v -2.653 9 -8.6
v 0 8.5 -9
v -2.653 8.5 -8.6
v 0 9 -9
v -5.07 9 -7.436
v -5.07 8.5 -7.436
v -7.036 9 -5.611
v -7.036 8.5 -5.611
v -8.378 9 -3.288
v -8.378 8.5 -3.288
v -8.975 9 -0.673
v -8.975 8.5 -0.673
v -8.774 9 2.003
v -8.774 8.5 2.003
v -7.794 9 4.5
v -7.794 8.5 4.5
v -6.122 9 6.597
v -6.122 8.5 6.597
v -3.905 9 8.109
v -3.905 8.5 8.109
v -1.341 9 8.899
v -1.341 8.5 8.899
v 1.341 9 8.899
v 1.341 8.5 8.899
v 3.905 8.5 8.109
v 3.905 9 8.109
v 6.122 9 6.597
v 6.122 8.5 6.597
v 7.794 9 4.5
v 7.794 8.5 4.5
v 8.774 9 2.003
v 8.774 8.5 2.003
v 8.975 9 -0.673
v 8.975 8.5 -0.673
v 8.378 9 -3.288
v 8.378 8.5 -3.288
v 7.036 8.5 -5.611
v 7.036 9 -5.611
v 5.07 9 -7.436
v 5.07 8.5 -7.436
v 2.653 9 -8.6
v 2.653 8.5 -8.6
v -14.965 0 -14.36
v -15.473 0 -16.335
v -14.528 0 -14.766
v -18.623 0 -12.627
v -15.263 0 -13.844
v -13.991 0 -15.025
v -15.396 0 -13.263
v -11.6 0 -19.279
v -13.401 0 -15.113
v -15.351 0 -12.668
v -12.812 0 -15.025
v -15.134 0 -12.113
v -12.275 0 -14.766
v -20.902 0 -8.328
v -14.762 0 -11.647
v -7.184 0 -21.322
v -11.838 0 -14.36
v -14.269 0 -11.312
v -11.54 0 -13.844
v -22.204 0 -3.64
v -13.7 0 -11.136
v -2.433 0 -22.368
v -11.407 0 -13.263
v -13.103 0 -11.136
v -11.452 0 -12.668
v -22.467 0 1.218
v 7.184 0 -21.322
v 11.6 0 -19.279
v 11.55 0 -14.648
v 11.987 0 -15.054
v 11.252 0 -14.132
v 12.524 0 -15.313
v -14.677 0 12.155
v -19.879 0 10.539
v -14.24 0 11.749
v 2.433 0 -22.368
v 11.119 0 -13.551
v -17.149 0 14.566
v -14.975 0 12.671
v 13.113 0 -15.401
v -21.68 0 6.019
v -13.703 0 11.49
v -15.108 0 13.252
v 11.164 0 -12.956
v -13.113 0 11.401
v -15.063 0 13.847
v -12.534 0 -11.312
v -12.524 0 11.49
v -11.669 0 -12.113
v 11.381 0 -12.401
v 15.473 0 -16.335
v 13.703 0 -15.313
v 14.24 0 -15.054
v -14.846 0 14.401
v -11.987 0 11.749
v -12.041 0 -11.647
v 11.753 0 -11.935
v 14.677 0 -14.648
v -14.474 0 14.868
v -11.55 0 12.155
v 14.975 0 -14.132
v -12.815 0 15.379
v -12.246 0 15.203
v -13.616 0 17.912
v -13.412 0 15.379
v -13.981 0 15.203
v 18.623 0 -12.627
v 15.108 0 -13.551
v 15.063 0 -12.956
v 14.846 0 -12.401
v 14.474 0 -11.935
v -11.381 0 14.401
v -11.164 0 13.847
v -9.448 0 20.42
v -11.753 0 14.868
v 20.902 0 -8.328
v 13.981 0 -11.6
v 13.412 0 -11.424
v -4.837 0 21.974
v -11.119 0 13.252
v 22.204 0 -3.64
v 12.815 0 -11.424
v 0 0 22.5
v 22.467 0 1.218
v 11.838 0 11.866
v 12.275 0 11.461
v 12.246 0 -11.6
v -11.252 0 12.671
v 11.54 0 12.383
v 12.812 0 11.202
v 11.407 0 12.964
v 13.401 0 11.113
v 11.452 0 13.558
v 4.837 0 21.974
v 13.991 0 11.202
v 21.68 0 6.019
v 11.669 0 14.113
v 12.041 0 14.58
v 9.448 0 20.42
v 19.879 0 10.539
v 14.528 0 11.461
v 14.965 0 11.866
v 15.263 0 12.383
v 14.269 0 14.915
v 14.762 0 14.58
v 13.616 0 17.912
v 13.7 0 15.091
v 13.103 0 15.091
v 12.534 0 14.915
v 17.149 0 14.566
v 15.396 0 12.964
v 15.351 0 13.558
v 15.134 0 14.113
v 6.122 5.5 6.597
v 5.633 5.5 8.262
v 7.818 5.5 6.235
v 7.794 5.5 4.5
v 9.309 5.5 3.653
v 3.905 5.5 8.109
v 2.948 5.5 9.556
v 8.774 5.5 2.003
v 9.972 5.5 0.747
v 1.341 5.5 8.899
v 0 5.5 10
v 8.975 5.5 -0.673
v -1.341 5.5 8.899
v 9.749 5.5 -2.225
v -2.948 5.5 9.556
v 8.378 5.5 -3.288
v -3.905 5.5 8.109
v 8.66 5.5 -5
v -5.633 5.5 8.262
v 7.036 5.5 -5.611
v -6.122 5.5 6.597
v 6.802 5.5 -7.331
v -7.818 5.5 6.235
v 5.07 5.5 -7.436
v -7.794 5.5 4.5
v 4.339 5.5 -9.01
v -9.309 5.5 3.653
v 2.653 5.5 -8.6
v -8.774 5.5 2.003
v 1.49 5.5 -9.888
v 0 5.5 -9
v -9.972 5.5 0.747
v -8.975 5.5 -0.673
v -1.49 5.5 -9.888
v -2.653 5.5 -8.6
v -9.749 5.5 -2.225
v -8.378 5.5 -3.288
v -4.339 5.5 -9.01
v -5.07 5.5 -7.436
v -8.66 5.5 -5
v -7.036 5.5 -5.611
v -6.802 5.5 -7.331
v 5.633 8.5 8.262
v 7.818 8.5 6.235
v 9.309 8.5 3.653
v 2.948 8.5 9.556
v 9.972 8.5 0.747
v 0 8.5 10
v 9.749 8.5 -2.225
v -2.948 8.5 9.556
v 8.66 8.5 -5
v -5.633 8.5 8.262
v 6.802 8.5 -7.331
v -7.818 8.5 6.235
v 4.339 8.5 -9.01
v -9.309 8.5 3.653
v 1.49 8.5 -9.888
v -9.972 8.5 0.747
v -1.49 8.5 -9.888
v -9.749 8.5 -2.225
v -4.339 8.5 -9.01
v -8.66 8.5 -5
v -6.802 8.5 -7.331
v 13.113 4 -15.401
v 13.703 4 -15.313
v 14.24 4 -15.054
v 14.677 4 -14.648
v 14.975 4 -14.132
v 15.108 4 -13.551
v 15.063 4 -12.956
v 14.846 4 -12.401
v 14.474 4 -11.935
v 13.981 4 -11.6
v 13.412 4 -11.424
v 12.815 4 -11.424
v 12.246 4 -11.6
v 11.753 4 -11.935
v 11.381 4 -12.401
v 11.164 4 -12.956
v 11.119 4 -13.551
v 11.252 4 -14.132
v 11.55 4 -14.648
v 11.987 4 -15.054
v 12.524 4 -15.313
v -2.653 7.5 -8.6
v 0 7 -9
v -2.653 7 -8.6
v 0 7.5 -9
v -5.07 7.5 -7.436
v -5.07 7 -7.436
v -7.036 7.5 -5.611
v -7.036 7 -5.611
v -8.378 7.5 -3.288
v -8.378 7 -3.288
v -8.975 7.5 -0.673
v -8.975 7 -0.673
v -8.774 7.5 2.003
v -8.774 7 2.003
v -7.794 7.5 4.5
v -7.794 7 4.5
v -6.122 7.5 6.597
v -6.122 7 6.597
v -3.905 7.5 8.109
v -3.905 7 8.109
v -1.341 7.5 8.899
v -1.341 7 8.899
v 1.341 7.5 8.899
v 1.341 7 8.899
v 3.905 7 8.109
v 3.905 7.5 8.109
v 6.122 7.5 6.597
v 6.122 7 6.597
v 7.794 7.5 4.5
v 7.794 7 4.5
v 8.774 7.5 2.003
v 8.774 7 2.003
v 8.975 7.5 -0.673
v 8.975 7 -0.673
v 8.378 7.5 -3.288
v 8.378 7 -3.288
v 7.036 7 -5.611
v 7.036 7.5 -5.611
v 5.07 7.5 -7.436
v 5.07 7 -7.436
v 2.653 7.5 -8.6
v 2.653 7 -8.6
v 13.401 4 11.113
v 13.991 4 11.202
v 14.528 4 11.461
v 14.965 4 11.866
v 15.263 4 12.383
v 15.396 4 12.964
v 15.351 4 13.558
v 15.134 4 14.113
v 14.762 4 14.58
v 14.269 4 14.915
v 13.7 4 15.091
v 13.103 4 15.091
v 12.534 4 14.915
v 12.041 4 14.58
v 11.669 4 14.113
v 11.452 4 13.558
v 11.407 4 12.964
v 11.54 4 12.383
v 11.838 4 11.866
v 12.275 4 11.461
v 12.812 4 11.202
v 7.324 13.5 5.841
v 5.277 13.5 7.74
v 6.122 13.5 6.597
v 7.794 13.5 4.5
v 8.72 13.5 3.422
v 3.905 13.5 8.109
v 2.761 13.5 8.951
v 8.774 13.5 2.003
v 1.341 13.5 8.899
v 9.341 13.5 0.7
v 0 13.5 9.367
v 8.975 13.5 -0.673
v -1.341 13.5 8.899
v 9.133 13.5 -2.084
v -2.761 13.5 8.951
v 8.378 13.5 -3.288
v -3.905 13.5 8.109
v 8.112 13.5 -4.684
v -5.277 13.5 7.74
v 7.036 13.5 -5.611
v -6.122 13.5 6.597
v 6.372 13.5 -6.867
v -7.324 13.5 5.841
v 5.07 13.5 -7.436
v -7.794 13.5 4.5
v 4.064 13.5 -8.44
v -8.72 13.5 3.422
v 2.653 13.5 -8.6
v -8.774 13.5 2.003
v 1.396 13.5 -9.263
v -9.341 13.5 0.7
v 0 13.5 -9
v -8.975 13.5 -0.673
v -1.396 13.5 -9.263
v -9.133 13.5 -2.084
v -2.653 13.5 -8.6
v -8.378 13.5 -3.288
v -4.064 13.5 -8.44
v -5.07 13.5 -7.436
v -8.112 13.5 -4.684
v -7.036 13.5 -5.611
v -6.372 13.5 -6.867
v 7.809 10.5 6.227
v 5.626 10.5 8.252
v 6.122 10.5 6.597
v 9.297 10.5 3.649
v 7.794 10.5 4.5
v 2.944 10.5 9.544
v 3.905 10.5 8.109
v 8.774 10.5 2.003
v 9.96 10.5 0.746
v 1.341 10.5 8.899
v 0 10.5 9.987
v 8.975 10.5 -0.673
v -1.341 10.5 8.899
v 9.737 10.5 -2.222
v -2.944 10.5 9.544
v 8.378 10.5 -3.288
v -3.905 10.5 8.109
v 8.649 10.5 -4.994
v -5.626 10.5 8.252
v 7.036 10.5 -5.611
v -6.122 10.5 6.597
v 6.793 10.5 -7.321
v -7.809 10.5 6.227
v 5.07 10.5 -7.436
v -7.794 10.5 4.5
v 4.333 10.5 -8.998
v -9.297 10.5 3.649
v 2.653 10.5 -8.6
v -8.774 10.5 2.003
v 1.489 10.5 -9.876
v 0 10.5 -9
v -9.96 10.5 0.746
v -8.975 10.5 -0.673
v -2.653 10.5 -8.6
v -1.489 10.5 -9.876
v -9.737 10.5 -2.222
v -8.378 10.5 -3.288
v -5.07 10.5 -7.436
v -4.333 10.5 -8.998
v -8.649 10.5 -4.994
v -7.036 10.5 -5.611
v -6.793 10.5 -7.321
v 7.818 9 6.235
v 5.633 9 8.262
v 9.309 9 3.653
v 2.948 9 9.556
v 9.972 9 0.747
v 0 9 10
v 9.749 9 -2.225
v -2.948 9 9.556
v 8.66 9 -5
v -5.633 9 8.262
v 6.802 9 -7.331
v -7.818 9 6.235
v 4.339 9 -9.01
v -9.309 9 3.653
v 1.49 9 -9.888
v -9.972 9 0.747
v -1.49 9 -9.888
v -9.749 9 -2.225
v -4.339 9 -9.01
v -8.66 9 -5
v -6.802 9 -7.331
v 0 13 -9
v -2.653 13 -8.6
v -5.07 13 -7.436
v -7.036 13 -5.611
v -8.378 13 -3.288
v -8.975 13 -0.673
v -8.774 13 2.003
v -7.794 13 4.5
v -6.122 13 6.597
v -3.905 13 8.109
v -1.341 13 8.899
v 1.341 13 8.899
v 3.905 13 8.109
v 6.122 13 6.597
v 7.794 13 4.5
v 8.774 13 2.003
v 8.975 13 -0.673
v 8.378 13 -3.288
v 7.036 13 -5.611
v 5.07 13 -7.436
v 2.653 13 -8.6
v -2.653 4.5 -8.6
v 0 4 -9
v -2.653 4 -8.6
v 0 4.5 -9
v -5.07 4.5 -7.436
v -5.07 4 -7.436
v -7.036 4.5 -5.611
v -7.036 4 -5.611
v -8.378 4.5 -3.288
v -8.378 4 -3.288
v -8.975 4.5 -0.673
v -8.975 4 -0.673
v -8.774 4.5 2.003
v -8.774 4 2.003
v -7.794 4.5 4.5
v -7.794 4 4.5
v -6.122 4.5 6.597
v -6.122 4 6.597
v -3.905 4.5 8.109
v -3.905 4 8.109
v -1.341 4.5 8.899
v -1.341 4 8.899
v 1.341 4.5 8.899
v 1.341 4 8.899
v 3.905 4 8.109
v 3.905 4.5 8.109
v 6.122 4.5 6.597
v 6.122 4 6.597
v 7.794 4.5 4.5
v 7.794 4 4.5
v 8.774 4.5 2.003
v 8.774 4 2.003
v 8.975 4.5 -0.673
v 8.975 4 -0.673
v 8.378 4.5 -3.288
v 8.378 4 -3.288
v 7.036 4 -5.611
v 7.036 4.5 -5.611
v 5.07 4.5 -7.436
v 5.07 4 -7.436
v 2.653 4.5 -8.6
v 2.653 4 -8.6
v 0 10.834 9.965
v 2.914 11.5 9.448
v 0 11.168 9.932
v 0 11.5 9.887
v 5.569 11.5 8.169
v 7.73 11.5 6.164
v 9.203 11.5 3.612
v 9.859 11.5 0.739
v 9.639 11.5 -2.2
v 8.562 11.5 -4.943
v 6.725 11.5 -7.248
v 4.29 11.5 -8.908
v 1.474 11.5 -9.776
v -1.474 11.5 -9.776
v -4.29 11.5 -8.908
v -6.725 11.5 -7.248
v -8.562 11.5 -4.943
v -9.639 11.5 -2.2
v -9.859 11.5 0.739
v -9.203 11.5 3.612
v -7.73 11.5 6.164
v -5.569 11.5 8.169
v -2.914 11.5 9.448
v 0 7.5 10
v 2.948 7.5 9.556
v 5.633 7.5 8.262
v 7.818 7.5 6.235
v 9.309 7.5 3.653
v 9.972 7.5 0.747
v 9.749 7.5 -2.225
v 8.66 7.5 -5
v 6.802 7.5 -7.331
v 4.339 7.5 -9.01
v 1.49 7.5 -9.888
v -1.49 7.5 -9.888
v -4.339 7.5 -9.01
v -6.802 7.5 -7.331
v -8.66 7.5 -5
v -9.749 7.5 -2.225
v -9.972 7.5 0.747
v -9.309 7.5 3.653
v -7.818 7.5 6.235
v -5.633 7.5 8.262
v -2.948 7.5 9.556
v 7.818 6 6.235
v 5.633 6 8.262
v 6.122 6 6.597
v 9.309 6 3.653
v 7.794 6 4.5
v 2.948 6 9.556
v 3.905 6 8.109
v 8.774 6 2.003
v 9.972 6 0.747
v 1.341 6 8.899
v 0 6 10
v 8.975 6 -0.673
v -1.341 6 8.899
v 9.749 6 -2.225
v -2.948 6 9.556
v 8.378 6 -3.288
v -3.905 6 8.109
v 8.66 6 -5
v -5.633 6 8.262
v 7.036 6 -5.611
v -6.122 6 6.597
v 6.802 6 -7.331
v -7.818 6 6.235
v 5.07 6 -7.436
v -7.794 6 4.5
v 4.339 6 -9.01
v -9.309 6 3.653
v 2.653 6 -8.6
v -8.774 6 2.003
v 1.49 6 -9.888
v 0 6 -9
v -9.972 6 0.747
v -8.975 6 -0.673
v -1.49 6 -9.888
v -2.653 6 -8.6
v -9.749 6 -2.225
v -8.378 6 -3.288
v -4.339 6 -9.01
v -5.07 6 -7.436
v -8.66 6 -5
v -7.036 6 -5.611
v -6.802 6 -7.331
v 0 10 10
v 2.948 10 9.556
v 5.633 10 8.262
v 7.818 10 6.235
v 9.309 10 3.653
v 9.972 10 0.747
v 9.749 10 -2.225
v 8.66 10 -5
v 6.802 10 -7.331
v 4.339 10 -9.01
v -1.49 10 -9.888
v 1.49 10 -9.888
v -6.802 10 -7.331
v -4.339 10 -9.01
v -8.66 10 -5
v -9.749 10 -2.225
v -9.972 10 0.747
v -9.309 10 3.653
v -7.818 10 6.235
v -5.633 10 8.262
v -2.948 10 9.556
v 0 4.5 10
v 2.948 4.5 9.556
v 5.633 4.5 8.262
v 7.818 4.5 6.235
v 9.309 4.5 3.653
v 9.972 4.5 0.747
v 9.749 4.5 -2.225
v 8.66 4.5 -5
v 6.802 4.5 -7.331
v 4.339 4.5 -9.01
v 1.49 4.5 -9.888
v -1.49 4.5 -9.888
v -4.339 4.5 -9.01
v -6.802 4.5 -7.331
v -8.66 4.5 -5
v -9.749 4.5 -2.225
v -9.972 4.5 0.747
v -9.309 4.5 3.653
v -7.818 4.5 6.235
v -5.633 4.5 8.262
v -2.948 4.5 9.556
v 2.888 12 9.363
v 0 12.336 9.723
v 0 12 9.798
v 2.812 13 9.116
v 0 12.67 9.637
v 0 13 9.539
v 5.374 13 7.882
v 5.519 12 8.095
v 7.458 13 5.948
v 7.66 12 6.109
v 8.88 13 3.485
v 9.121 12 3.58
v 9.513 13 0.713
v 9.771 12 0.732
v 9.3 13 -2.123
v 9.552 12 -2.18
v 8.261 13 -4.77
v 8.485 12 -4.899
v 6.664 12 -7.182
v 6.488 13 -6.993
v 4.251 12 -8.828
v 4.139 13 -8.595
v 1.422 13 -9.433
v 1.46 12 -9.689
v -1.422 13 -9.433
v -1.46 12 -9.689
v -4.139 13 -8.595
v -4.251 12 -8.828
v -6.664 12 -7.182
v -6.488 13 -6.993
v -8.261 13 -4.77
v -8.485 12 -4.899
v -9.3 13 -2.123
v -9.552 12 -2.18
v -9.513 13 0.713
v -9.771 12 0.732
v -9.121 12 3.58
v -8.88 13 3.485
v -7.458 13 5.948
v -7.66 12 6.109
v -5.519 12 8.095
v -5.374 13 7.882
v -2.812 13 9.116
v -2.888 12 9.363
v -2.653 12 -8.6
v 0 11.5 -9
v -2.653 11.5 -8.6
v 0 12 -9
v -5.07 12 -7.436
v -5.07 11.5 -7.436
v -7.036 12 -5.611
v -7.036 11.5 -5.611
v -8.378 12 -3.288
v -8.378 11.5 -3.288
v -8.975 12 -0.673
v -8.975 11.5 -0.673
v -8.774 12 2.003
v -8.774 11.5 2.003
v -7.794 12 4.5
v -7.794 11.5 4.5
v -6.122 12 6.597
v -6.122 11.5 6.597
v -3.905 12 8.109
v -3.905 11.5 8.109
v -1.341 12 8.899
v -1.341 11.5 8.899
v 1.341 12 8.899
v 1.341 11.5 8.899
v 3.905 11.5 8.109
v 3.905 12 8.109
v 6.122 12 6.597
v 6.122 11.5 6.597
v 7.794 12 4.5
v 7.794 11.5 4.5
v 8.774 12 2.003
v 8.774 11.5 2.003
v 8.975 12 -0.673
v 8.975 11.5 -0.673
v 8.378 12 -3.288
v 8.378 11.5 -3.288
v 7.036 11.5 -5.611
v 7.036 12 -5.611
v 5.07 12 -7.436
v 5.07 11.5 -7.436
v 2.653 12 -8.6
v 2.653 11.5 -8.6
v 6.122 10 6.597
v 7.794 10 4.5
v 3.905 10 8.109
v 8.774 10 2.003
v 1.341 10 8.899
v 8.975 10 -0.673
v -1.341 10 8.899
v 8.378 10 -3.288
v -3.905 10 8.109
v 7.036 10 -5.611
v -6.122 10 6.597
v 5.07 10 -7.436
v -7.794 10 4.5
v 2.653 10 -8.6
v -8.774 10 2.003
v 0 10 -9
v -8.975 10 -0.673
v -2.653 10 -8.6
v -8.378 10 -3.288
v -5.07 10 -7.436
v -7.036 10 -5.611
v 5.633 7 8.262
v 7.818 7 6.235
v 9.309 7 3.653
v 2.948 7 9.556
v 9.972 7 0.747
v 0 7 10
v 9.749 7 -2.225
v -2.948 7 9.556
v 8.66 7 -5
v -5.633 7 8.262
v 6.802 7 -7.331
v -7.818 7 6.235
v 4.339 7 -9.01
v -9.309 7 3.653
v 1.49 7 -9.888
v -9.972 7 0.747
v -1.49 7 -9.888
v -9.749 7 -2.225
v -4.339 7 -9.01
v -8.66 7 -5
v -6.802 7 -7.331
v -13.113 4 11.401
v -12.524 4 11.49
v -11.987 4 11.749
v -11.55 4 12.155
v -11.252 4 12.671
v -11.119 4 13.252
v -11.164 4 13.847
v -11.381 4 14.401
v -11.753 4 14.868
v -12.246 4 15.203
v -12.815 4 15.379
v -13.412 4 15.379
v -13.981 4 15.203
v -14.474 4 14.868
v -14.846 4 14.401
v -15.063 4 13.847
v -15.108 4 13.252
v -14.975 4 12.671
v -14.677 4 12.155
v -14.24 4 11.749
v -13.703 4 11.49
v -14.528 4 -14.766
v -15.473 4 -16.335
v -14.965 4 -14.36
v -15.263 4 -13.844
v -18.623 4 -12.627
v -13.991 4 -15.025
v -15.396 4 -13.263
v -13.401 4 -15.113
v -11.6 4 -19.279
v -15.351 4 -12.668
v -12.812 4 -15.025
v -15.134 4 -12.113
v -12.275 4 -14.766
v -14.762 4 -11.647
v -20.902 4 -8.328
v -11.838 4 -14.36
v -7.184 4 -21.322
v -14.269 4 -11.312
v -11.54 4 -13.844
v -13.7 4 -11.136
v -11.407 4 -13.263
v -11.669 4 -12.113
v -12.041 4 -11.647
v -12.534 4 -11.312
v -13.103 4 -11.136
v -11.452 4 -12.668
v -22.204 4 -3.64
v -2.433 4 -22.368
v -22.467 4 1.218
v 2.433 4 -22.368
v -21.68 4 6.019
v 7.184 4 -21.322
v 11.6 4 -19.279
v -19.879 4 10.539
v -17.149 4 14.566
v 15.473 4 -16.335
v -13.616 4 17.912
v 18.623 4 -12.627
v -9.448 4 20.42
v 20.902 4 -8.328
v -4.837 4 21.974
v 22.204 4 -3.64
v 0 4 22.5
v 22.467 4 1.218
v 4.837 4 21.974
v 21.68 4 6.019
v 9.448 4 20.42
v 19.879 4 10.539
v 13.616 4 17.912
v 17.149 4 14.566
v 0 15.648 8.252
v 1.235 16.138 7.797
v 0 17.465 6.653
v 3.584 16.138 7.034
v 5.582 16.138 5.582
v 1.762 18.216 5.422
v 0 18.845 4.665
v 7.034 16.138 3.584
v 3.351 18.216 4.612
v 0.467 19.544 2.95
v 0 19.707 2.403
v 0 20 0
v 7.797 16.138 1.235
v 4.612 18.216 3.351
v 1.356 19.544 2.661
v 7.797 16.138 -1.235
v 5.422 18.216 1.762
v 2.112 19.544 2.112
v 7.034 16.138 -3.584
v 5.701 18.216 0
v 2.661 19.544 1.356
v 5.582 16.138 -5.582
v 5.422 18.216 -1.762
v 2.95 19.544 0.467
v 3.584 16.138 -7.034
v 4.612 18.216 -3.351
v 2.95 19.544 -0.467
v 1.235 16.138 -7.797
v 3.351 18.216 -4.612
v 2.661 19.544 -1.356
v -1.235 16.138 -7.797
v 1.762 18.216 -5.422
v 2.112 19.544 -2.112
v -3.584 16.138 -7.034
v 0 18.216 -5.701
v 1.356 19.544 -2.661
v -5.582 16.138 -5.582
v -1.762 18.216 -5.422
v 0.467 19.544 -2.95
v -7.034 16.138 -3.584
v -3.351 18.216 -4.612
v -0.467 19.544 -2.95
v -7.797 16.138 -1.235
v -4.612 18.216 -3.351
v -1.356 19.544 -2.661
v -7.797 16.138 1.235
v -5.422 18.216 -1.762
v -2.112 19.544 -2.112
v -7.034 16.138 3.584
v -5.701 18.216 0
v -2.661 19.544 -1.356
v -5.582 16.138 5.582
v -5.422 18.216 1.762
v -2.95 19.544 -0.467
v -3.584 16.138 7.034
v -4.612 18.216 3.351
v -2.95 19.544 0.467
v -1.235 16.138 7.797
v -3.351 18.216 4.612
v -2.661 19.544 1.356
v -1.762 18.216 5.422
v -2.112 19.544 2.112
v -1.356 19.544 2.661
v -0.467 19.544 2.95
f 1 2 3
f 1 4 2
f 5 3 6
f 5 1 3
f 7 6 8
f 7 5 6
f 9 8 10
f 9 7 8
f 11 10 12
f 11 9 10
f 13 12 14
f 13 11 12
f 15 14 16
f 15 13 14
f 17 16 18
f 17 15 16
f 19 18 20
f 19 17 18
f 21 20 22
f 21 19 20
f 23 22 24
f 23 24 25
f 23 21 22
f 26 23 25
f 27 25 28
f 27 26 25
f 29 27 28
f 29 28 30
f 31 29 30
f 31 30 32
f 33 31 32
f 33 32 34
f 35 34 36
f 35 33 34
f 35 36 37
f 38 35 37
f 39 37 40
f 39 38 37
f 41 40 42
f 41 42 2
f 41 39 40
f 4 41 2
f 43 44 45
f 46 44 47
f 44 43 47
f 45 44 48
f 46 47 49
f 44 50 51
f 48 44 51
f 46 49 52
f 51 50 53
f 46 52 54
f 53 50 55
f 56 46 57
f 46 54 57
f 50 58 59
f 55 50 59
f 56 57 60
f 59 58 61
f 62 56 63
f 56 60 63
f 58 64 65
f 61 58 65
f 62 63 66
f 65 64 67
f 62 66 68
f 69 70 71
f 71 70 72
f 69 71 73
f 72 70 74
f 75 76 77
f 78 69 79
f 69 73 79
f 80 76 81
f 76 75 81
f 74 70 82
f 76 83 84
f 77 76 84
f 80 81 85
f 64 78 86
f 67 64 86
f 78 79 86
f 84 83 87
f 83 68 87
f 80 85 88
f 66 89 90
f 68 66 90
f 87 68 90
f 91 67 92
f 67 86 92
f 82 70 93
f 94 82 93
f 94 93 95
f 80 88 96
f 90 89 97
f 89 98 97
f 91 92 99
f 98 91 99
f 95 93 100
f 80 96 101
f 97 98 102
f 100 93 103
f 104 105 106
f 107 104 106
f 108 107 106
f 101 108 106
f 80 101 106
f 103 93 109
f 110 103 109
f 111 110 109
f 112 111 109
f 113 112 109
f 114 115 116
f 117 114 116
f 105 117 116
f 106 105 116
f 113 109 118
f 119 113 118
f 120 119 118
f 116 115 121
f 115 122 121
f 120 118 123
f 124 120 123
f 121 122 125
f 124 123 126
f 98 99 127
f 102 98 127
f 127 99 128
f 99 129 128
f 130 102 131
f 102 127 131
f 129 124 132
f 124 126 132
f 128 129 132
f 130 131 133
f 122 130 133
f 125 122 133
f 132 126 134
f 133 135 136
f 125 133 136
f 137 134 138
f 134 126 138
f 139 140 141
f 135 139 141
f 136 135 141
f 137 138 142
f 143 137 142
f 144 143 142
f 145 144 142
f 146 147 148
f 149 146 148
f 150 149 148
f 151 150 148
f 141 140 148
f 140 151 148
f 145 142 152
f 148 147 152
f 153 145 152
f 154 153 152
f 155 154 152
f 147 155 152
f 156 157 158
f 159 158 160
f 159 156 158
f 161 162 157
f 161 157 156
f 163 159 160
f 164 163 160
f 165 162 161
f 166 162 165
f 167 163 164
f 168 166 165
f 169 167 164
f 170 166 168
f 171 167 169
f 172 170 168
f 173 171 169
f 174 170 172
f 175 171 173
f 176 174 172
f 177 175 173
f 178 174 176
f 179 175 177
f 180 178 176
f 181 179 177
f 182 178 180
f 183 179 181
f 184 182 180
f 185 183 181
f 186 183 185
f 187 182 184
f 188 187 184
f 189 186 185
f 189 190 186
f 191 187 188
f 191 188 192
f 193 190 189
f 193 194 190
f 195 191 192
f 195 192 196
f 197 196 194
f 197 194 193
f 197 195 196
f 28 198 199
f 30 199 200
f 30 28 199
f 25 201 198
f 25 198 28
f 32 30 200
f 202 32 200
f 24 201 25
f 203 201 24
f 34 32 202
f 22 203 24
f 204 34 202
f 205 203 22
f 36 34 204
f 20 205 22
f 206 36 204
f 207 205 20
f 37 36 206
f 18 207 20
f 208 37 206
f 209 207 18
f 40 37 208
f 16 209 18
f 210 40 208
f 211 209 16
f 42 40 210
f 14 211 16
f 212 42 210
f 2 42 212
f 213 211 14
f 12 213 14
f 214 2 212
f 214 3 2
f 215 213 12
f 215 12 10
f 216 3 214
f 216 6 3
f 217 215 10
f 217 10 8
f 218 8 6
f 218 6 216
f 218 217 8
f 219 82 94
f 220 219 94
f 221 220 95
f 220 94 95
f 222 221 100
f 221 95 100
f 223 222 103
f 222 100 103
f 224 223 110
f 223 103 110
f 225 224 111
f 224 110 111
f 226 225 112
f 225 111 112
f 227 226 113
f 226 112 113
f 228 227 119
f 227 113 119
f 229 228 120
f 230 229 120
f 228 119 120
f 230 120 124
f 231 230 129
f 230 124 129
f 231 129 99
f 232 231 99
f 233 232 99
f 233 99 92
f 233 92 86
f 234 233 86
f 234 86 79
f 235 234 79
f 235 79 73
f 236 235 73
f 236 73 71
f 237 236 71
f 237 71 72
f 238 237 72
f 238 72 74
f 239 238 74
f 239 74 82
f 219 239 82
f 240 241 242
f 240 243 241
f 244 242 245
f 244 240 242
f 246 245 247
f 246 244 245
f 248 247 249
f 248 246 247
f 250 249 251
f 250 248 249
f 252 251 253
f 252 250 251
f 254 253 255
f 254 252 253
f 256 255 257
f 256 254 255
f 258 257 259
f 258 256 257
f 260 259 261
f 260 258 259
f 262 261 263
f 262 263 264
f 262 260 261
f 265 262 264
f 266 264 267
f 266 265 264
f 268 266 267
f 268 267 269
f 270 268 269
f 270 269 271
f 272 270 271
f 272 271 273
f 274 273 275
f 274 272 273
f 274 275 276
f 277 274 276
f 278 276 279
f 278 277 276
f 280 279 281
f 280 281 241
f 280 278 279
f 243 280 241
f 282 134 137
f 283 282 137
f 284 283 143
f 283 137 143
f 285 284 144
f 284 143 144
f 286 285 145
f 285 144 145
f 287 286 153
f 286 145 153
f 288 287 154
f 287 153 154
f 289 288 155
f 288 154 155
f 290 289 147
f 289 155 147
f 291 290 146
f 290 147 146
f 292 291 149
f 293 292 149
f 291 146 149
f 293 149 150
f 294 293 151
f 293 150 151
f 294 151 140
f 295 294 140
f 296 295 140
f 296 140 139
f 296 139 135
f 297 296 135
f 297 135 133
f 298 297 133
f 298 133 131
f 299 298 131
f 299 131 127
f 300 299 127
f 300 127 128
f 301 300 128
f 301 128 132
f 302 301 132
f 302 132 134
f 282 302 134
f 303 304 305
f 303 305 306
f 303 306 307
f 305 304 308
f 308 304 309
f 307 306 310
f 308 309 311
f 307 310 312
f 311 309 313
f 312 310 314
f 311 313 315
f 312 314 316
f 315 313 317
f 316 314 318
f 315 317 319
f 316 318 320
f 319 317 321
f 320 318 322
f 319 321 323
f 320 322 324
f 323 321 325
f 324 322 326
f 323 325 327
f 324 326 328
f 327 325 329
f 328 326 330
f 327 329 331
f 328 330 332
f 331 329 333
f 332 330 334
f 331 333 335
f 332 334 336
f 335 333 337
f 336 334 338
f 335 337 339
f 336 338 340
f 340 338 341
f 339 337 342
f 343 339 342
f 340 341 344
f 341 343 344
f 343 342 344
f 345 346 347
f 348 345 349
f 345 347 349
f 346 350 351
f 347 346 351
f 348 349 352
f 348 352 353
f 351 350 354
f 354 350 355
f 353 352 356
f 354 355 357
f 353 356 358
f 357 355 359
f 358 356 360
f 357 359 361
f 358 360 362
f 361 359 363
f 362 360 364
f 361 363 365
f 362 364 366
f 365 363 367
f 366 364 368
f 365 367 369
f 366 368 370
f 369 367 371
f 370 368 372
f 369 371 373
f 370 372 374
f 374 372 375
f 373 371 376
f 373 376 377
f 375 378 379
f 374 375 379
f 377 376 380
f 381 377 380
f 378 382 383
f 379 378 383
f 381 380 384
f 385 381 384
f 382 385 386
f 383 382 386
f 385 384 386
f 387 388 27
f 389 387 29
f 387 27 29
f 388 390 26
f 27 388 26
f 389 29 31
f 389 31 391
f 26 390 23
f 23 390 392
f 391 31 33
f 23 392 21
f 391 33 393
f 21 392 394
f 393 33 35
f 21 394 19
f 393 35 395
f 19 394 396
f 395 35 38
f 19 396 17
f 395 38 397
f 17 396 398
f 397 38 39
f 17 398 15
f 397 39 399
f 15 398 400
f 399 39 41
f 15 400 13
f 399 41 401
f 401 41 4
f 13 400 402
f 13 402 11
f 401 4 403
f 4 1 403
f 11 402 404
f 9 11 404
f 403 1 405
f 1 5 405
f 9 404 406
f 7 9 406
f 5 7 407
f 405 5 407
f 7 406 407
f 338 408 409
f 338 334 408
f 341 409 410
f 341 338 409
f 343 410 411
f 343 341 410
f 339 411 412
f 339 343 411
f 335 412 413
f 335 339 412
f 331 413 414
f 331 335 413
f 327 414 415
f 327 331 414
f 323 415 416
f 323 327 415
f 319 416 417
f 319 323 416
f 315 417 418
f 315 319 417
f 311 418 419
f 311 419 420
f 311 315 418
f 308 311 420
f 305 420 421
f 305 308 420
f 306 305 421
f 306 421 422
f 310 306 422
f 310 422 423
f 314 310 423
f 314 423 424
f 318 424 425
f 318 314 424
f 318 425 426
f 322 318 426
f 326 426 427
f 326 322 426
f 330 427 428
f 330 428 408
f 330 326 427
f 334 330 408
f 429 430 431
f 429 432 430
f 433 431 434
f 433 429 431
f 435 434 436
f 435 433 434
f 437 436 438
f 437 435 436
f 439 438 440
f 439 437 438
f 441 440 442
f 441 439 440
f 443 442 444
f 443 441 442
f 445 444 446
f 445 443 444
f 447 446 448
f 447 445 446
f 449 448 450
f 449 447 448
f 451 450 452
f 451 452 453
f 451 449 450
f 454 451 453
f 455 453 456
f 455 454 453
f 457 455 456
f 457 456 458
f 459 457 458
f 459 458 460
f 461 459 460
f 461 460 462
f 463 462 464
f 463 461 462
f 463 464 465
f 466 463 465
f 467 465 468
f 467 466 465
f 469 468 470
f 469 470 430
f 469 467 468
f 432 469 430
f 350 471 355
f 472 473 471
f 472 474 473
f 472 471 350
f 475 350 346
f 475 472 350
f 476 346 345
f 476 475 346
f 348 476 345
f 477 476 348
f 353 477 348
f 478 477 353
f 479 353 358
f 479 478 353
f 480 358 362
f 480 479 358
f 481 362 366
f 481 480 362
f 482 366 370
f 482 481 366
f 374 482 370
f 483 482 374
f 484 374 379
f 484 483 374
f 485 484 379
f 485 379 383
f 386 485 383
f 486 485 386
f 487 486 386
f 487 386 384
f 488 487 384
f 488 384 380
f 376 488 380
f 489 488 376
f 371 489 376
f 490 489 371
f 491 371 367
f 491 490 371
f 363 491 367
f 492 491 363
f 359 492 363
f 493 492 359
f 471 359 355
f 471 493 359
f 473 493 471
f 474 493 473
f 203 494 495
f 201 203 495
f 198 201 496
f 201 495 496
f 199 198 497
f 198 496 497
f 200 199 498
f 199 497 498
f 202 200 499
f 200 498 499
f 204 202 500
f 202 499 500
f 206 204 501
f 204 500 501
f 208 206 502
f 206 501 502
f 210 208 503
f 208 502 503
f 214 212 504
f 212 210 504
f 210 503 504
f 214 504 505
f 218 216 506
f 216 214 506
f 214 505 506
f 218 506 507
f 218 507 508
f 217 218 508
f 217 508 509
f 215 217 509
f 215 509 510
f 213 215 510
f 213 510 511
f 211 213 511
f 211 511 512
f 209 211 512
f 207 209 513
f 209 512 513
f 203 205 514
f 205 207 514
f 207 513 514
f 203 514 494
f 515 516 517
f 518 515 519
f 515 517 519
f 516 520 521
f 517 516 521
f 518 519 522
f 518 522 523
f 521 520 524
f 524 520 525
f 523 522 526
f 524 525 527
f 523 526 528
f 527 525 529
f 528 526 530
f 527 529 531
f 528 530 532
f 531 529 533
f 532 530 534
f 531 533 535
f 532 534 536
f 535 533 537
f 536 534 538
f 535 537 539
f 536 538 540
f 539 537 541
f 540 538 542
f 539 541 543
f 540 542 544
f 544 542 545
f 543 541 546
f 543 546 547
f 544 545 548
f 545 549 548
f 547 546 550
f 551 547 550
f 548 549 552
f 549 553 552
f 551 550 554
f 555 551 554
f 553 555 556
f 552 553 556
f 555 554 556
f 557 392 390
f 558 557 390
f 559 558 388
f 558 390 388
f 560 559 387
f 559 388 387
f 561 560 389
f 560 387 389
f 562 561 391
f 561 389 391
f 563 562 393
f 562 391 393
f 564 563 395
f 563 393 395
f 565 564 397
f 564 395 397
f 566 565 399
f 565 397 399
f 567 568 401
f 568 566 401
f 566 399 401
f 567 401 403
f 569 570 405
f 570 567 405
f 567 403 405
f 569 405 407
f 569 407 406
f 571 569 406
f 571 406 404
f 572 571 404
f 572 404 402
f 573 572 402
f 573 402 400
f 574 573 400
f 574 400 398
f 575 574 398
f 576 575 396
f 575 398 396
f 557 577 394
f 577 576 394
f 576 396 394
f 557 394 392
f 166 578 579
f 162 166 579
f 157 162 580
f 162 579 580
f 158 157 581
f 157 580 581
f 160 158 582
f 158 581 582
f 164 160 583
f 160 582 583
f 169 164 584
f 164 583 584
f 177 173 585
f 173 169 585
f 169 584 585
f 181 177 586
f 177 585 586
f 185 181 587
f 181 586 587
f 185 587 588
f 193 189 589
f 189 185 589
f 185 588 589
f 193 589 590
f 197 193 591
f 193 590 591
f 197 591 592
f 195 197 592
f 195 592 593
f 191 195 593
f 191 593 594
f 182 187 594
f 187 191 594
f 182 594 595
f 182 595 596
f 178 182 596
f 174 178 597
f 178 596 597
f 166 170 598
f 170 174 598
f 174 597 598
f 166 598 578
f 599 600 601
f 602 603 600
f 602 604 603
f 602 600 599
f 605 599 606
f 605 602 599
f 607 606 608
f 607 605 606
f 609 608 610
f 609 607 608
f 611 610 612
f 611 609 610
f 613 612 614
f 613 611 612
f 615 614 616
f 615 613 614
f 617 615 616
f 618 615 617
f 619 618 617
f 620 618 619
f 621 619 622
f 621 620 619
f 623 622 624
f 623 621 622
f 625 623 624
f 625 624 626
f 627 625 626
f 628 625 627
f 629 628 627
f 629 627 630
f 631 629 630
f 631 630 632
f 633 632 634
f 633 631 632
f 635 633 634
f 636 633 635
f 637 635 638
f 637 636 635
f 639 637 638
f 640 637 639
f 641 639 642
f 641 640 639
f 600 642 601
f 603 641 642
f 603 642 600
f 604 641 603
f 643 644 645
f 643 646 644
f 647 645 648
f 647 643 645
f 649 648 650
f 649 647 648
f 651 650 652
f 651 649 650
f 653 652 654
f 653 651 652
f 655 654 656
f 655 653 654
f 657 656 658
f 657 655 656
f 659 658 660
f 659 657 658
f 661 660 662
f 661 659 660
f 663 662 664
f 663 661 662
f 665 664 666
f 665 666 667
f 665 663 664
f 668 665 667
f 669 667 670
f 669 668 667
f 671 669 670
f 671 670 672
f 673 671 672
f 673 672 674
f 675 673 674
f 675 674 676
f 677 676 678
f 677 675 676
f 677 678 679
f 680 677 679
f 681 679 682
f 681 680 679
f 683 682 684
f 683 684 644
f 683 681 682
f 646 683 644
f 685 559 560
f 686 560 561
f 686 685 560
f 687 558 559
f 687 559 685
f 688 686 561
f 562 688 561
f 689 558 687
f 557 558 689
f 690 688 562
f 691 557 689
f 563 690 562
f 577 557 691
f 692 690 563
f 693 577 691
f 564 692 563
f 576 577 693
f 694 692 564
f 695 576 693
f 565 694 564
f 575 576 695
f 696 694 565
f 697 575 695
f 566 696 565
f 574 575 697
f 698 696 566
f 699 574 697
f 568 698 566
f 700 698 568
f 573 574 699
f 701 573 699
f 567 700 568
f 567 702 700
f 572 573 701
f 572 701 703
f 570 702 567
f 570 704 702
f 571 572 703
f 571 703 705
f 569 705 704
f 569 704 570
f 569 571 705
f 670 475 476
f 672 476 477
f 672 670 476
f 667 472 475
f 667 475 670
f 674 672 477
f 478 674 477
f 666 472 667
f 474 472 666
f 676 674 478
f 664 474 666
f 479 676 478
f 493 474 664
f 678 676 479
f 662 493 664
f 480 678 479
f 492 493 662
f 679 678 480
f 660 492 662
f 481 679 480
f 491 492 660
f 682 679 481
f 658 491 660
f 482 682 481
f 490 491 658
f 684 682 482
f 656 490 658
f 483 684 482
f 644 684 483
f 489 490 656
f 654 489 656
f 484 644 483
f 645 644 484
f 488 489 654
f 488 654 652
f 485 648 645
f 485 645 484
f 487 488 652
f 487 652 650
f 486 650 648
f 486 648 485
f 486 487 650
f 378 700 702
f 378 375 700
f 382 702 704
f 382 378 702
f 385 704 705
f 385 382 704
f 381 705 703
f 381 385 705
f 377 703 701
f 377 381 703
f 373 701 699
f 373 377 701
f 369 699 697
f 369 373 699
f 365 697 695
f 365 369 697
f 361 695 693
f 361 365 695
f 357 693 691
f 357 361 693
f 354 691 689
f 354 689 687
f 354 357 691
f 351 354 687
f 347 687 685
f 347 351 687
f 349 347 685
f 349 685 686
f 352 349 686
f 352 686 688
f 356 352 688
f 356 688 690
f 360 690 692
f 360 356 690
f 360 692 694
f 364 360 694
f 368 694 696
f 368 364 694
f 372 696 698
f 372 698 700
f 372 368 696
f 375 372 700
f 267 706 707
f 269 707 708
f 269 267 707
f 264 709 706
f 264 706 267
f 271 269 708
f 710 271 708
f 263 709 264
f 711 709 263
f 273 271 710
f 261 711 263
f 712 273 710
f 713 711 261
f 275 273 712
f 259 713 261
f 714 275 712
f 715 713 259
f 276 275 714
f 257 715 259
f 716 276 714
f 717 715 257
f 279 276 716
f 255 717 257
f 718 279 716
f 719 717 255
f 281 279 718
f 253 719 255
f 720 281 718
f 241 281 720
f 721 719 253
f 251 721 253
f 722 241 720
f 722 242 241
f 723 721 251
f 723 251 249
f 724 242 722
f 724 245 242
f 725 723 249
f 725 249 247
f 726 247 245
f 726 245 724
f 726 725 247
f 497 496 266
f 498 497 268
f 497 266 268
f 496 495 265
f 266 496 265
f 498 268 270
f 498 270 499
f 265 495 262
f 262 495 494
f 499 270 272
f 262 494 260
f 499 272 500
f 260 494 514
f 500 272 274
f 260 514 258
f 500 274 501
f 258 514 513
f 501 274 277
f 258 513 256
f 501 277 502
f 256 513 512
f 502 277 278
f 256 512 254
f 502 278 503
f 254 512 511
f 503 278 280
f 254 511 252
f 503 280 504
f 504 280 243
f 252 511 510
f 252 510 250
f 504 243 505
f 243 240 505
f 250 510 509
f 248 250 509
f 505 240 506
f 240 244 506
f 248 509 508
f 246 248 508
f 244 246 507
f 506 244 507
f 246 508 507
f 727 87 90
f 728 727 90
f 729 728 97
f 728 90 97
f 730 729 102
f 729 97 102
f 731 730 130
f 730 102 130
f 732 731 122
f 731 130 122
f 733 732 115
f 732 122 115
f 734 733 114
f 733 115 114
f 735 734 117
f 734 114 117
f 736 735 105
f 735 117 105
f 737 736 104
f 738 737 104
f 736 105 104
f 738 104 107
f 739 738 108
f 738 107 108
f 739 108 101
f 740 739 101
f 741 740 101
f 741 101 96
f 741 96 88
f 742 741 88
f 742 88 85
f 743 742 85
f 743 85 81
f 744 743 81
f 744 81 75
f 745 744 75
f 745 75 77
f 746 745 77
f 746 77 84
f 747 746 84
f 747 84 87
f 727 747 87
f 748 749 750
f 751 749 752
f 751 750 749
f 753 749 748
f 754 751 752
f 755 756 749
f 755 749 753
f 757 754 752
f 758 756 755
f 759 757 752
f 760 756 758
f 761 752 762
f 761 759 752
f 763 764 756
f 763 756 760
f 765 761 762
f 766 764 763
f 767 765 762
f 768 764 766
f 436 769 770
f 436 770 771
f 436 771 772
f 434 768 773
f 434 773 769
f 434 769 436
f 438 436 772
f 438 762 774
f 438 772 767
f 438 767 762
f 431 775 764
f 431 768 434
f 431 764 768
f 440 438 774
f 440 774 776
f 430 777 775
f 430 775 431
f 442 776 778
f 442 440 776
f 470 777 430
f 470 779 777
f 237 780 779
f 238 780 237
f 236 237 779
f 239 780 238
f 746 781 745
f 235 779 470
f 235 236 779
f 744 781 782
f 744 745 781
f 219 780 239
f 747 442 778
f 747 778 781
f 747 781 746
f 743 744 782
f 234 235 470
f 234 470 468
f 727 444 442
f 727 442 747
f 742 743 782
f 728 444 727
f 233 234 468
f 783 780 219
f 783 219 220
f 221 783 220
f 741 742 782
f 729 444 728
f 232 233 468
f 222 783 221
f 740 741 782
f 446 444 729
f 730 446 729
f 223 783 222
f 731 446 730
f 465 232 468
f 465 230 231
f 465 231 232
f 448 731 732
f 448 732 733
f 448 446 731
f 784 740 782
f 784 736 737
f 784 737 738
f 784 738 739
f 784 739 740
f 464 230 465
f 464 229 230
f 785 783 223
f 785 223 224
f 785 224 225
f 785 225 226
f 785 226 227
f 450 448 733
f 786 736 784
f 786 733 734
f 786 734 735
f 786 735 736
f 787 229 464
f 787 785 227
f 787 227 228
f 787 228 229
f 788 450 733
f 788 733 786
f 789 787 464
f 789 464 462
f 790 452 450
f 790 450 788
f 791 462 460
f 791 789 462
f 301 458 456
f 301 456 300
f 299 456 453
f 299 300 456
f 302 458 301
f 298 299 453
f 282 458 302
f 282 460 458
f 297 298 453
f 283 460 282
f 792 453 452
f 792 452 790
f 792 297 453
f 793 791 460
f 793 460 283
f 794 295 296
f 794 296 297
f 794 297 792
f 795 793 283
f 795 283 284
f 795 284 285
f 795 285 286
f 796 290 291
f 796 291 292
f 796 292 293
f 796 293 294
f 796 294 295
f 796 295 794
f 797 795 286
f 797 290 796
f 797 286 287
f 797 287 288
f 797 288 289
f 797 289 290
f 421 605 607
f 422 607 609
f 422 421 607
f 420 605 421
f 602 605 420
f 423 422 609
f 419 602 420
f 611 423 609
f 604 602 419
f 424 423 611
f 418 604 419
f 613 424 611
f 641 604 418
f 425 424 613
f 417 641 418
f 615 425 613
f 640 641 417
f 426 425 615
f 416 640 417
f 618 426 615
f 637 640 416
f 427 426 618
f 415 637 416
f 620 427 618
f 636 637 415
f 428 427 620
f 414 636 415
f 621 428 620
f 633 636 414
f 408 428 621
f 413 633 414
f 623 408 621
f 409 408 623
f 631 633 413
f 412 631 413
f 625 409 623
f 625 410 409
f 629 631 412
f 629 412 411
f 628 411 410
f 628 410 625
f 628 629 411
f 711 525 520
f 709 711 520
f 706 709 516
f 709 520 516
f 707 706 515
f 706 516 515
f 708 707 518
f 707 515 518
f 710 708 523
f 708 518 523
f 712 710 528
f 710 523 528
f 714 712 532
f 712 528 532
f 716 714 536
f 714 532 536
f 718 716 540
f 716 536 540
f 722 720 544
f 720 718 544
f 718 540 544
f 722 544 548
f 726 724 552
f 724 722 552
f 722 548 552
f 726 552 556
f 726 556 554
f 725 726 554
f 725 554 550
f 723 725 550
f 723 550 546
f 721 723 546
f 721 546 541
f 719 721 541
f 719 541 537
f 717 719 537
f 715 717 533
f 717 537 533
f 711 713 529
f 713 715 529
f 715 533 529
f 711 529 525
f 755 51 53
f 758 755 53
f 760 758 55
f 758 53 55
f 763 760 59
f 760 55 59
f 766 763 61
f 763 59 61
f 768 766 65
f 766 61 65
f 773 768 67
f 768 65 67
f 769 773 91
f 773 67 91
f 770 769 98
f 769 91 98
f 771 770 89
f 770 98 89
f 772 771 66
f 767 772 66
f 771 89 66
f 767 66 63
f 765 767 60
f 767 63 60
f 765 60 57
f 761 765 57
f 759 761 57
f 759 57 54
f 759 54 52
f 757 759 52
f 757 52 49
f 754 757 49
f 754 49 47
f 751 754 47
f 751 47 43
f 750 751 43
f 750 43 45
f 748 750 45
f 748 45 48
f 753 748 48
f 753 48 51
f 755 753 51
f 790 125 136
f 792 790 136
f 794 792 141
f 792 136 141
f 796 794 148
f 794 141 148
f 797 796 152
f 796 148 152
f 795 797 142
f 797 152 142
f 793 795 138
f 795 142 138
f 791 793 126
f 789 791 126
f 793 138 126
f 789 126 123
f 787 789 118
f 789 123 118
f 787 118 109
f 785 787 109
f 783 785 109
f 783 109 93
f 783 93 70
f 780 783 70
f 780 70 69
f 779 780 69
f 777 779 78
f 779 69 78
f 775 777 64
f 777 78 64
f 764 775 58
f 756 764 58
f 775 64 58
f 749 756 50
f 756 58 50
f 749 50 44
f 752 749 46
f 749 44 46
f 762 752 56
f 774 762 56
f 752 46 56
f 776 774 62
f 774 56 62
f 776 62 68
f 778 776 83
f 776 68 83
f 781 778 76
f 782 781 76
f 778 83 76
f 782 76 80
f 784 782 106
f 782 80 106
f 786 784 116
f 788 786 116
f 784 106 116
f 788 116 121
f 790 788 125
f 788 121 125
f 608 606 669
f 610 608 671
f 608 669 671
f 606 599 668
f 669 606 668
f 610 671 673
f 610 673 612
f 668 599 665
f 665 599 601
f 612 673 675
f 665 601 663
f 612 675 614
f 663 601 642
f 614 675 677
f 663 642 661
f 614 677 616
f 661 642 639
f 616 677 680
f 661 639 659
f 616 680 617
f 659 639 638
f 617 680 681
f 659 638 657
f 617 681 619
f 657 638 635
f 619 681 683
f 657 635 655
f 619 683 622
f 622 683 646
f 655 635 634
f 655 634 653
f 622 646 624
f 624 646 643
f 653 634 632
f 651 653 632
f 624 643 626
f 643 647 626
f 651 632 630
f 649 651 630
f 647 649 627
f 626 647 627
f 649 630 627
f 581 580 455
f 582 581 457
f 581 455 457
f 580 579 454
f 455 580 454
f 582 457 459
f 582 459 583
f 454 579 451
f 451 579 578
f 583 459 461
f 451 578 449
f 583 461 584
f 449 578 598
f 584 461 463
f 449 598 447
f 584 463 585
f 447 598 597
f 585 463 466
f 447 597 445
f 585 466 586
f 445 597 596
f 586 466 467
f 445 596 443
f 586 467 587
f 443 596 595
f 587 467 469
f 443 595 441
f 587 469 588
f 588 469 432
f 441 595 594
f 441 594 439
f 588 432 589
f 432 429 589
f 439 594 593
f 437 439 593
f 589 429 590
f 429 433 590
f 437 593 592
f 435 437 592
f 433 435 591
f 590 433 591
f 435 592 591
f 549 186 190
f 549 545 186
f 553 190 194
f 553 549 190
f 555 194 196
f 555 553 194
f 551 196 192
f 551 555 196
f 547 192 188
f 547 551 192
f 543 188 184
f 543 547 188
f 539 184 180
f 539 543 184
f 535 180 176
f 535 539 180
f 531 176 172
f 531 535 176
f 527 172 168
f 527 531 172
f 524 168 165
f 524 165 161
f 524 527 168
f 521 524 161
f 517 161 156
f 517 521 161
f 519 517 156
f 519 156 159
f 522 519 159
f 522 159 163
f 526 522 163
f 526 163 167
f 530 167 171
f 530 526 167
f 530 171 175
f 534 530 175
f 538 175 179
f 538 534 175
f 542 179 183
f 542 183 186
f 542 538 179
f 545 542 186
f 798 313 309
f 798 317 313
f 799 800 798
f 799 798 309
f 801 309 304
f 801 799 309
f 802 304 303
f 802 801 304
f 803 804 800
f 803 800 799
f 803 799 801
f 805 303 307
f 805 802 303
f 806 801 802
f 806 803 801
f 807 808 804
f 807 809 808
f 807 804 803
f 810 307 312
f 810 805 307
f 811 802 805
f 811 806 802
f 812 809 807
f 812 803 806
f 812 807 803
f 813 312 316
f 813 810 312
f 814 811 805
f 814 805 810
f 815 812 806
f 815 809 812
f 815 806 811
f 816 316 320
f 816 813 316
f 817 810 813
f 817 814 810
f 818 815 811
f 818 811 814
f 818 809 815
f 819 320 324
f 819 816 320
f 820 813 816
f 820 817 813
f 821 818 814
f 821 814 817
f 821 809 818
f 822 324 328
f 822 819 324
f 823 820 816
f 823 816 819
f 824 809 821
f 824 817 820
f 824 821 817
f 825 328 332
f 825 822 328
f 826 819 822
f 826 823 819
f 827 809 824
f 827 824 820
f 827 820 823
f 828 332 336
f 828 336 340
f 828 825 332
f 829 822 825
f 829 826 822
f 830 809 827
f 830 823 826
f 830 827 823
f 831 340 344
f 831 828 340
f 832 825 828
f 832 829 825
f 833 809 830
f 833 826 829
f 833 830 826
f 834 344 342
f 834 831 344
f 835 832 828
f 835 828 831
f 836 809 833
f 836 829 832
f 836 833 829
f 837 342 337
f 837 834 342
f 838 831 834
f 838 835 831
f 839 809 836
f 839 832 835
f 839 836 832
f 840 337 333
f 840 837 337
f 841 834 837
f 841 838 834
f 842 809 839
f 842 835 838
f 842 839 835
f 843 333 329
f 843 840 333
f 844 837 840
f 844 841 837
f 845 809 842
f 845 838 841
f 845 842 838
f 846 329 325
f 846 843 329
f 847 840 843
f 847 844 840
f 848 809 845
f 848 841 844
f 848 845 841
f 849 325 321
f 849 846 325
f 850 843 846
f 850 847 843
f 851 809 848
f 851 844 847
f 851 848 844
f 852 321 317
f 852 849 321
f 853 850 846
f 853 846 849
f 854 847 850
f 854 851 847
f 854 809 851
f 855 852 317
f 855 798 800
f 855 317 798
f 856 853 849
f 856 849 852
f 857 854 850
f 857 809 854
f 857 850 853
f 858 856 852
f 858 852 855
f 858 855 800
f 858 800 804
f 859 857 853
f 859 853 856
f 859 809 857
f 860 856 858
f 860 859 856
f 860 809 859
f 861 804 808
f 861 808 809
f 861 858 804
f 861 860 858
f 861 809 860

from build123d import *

# Parameters (mm, degrees)
SKETCH_1_R          = 22.5
EXTRUDE_1_DEPTH     = 4
SKETCH_2_R          = 10
EXTRUDE_2_DEPTH     = 16
FILLET_1_R          = 10
SKETCH_3_R          = 2
CUT_EXTRUDE_1_DEPTH = 10
SKETCH_4_W          = 1
SKETCH_4_H          = 0.5


with BuildPart() as part:
    # 草图1 → 凸台-拉伸1 (new body)
    with BuildSketch(Plane(origin=(0, 0, 0), x_dir=(1, 0, 0), z_dir=(0, 1, 0))):
        Circle(SKETCH_1_R)
    extrude(amount=EXTRUDE_1_DEPTH)

    # 草图2 → 凸台-拉伸2 (add)
    with BuildSketch(Plane(origin=(0, 4, 0), x_dir=(1, 0, 0), z_dir=(0, 1, 0))):
        Circle(SKETCH_2_R)
    extrude(amount=EXTRUDE_2_DEPTH)

    # 圆角1
    fillet_1_edges = [part.edges().sort_by_distance(p)[0] for p in [
        (-10, 20, 0),
    ]]
    fillet(fillet_1_edges, radius=FILLET_1_R)

    # 草图3 → 切除-拉伸1 (cut)
    with BuildSketch(Plane.XZ):
        with Locations((-13.113453203, 13.401486674)):
            Circle(SKETCH_3_R)
        with Locations((-13.401486674, -13.113453203)):
            Circle(SKETCH_3_R)
        with Locations((13.113453203, -13.401486674)):
            Circle(SKETCH_3_R)
        with Locations((13.401486674, 13.113453203)):
            Circle(SKETCH_3_R)
    extrude(amount=-CUT_EXTRUDE_1_DEPTH, mode=Mode.SUBTRACT)

    # 草图4 → 切除-旋转1 (revolve, cut)
    with BuildSketch(Plane.XY):
        with Locations((-9.5, 4.25)):
            Rectangle(SKETCH_4_W, SKETCH_4_H)
        with Locations((-9.5, 5.75)):
            Rectangle(SKETCH_4_W, SKETCH_4_H)
        with Locations((-9.5, 7.25)):
            Rectangle(SKETCH_4_W, SKETCH_4_H)
        with Locations((-9.5, 8.75)):
            Rectangle(SKETCH_4_W, SKETCH_4_H)
        with Locations((-9.5, 10.25)):
            Rectangle(SKETCH_4_W, SKETCH_4_H)
        with Locations((-9.5, 11.75)):
            Rectangle(SKETCH_4_W, SKETCH_4_H)
        with Locations((-9.5, 13.25)):
            Rectangle(SKETCH_4_W, SKETCH_4_H)
        with Locations((-9.5, 14.75)):
            Rectangle(SKETCH_4_W, SKETCH_4_H)
        with Locations((-9.5, 16.25)):
            Rectangle(SKETCH_4_W, SKETCH_4_H)
        with Locations((-9.5, 17.75)):
            Rectangle(SKETCH_4_W, SKETCH_4_H)
        with Locations((-9.5, 19.25)):
            Rectangle(SKETCH_4_W, SKETCH_4_H)
    revolve(axis=Axis((0, 0, 0), (0, 1, 0)), mode=Mode.SUBTRACT)


solid = part.part
